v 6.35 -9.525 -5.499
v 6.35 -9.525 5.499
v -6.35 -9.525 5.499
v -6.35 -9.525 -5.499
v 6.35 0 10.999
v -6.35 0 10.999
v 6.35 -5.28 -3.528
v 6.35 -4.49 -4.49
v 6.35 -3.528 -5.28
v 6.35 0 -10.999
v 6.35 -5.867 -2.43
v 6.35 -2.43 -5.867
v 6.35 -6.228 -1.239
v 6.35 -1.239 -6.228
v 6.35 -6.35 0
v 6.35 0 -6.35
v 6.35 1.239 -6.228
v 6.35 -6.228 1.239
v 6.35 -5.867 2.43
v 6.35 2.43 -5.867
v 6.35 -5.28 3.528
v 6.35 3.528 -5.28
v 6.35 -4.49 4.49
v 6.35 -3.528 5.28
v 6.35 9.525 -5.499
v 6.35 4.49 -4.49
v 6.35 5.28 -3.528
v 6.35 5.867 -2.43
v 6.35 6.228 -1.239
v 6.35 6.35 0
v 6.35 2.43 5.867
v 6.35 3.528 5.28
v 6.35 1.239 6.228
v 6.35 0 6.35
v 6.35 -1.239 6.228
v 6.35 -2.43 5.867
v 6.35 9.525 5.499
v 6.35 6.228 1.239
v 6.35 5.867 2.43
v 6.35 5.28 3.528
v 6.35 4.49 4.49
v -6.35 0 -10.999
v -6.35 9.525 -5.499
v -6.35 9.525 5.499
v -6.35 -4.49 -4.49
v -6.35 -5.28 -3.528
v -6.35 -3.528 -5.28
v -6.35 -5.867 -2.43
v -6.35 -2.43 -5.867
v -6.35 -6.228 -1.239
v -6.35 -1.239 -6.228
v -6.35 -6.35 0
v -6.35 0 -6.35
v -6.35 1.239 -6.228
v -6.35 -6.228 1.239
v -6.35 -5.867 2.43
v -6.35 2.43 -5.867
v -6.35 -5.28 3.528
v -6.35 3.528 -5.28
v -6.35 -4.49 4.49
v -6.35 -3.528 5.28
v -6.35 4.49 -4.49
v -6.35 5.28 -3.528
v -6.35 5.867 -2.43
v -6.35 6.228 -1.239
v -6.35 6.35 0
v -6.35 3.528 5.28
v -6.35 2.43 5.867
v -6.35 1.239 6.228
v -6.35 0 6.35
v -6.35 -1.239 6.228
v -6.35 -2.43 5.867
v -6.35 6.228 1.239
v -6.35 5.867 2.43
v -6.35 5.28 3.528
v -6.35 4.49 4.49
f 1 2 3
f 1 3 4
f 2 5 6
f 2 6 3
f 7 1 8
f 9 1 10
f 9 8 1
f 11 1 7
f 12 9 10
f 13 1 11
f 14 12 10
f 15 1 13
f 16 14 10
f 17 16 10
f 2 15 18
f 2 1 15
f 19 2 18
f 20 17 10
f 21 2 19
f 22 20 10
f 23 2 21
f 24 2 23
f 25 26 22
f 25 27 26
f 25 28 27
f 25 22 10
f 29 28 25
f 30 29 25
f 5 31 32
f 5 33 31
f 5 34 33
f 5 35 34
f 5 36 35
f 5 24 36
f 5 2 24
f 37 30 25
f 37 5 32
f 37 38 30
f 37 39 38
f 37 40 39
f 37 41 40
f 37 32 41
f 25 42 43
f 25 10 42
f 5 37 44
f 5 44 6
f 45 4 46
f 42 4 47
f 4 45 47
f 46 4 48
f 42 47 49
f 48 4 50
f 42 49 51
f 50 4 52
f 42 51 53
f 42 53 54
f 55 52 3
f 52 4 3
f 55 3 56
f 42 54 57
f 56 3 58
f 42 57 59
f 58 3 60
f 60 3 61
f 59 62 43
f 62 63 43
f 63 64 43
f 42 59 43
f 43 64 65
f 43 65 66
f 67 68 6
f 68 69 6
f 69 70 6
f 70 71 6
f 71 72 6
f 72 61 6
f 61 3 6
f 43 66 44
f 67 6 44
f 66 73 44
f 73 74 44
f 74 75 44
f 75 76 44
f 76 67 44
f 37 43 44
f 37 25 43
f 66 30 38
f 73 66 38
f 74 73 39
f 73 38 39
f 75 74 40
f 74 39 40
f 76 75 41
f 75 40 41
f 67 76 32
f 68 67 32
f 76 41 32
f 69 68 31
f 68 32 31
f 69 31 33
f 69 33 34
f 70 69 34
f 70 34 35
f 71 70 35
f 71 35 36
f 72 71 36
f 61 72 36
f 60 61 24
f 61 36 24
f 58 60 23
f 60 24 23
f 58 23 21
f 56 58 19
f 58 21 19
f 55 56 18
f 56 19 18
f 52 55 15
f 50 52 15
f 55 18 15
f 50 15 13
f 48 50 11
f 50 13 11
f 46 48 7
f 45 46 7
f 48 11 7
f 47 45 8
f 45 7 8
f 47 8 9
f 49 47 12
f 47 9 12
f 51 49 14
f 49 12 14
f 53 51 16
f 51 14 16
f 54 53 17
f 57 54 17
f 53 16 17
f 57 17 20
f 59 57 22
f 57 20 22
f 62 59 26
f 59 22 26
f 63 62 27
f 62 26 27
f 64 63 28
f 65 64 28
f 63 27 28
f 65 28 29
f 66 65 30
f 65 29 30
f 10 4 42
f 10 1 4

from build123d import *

# Parameters (mm, degrees)
F1_DEPTH = 6.35
F2_R     = 6.35
F3_DEPTH = 12.7


with BuildPart() as f1:
    # F0 (on Right) → F1 (new body, symmetric)
    with BuildSketch(Plane.YZ):
        Polygon((9.525, -5.499261), (9.525, 5.499261), (0, 10.998523), (-9.525, 5.499261), (-9.525, -5.499261), (0, -10.998523), align=None)
    extrude(amount=F1_DEPTH, both=True)

    # F2 (on face) → F3 (cut, symmetric)
    with BuildSketch(Plane.YZ.offset(6.35)):
        Circle(F2_R)
    extrude(amount=F3_DEPTH, both=True, mode=Mode.SUBTRACT)


solid = f1.part
